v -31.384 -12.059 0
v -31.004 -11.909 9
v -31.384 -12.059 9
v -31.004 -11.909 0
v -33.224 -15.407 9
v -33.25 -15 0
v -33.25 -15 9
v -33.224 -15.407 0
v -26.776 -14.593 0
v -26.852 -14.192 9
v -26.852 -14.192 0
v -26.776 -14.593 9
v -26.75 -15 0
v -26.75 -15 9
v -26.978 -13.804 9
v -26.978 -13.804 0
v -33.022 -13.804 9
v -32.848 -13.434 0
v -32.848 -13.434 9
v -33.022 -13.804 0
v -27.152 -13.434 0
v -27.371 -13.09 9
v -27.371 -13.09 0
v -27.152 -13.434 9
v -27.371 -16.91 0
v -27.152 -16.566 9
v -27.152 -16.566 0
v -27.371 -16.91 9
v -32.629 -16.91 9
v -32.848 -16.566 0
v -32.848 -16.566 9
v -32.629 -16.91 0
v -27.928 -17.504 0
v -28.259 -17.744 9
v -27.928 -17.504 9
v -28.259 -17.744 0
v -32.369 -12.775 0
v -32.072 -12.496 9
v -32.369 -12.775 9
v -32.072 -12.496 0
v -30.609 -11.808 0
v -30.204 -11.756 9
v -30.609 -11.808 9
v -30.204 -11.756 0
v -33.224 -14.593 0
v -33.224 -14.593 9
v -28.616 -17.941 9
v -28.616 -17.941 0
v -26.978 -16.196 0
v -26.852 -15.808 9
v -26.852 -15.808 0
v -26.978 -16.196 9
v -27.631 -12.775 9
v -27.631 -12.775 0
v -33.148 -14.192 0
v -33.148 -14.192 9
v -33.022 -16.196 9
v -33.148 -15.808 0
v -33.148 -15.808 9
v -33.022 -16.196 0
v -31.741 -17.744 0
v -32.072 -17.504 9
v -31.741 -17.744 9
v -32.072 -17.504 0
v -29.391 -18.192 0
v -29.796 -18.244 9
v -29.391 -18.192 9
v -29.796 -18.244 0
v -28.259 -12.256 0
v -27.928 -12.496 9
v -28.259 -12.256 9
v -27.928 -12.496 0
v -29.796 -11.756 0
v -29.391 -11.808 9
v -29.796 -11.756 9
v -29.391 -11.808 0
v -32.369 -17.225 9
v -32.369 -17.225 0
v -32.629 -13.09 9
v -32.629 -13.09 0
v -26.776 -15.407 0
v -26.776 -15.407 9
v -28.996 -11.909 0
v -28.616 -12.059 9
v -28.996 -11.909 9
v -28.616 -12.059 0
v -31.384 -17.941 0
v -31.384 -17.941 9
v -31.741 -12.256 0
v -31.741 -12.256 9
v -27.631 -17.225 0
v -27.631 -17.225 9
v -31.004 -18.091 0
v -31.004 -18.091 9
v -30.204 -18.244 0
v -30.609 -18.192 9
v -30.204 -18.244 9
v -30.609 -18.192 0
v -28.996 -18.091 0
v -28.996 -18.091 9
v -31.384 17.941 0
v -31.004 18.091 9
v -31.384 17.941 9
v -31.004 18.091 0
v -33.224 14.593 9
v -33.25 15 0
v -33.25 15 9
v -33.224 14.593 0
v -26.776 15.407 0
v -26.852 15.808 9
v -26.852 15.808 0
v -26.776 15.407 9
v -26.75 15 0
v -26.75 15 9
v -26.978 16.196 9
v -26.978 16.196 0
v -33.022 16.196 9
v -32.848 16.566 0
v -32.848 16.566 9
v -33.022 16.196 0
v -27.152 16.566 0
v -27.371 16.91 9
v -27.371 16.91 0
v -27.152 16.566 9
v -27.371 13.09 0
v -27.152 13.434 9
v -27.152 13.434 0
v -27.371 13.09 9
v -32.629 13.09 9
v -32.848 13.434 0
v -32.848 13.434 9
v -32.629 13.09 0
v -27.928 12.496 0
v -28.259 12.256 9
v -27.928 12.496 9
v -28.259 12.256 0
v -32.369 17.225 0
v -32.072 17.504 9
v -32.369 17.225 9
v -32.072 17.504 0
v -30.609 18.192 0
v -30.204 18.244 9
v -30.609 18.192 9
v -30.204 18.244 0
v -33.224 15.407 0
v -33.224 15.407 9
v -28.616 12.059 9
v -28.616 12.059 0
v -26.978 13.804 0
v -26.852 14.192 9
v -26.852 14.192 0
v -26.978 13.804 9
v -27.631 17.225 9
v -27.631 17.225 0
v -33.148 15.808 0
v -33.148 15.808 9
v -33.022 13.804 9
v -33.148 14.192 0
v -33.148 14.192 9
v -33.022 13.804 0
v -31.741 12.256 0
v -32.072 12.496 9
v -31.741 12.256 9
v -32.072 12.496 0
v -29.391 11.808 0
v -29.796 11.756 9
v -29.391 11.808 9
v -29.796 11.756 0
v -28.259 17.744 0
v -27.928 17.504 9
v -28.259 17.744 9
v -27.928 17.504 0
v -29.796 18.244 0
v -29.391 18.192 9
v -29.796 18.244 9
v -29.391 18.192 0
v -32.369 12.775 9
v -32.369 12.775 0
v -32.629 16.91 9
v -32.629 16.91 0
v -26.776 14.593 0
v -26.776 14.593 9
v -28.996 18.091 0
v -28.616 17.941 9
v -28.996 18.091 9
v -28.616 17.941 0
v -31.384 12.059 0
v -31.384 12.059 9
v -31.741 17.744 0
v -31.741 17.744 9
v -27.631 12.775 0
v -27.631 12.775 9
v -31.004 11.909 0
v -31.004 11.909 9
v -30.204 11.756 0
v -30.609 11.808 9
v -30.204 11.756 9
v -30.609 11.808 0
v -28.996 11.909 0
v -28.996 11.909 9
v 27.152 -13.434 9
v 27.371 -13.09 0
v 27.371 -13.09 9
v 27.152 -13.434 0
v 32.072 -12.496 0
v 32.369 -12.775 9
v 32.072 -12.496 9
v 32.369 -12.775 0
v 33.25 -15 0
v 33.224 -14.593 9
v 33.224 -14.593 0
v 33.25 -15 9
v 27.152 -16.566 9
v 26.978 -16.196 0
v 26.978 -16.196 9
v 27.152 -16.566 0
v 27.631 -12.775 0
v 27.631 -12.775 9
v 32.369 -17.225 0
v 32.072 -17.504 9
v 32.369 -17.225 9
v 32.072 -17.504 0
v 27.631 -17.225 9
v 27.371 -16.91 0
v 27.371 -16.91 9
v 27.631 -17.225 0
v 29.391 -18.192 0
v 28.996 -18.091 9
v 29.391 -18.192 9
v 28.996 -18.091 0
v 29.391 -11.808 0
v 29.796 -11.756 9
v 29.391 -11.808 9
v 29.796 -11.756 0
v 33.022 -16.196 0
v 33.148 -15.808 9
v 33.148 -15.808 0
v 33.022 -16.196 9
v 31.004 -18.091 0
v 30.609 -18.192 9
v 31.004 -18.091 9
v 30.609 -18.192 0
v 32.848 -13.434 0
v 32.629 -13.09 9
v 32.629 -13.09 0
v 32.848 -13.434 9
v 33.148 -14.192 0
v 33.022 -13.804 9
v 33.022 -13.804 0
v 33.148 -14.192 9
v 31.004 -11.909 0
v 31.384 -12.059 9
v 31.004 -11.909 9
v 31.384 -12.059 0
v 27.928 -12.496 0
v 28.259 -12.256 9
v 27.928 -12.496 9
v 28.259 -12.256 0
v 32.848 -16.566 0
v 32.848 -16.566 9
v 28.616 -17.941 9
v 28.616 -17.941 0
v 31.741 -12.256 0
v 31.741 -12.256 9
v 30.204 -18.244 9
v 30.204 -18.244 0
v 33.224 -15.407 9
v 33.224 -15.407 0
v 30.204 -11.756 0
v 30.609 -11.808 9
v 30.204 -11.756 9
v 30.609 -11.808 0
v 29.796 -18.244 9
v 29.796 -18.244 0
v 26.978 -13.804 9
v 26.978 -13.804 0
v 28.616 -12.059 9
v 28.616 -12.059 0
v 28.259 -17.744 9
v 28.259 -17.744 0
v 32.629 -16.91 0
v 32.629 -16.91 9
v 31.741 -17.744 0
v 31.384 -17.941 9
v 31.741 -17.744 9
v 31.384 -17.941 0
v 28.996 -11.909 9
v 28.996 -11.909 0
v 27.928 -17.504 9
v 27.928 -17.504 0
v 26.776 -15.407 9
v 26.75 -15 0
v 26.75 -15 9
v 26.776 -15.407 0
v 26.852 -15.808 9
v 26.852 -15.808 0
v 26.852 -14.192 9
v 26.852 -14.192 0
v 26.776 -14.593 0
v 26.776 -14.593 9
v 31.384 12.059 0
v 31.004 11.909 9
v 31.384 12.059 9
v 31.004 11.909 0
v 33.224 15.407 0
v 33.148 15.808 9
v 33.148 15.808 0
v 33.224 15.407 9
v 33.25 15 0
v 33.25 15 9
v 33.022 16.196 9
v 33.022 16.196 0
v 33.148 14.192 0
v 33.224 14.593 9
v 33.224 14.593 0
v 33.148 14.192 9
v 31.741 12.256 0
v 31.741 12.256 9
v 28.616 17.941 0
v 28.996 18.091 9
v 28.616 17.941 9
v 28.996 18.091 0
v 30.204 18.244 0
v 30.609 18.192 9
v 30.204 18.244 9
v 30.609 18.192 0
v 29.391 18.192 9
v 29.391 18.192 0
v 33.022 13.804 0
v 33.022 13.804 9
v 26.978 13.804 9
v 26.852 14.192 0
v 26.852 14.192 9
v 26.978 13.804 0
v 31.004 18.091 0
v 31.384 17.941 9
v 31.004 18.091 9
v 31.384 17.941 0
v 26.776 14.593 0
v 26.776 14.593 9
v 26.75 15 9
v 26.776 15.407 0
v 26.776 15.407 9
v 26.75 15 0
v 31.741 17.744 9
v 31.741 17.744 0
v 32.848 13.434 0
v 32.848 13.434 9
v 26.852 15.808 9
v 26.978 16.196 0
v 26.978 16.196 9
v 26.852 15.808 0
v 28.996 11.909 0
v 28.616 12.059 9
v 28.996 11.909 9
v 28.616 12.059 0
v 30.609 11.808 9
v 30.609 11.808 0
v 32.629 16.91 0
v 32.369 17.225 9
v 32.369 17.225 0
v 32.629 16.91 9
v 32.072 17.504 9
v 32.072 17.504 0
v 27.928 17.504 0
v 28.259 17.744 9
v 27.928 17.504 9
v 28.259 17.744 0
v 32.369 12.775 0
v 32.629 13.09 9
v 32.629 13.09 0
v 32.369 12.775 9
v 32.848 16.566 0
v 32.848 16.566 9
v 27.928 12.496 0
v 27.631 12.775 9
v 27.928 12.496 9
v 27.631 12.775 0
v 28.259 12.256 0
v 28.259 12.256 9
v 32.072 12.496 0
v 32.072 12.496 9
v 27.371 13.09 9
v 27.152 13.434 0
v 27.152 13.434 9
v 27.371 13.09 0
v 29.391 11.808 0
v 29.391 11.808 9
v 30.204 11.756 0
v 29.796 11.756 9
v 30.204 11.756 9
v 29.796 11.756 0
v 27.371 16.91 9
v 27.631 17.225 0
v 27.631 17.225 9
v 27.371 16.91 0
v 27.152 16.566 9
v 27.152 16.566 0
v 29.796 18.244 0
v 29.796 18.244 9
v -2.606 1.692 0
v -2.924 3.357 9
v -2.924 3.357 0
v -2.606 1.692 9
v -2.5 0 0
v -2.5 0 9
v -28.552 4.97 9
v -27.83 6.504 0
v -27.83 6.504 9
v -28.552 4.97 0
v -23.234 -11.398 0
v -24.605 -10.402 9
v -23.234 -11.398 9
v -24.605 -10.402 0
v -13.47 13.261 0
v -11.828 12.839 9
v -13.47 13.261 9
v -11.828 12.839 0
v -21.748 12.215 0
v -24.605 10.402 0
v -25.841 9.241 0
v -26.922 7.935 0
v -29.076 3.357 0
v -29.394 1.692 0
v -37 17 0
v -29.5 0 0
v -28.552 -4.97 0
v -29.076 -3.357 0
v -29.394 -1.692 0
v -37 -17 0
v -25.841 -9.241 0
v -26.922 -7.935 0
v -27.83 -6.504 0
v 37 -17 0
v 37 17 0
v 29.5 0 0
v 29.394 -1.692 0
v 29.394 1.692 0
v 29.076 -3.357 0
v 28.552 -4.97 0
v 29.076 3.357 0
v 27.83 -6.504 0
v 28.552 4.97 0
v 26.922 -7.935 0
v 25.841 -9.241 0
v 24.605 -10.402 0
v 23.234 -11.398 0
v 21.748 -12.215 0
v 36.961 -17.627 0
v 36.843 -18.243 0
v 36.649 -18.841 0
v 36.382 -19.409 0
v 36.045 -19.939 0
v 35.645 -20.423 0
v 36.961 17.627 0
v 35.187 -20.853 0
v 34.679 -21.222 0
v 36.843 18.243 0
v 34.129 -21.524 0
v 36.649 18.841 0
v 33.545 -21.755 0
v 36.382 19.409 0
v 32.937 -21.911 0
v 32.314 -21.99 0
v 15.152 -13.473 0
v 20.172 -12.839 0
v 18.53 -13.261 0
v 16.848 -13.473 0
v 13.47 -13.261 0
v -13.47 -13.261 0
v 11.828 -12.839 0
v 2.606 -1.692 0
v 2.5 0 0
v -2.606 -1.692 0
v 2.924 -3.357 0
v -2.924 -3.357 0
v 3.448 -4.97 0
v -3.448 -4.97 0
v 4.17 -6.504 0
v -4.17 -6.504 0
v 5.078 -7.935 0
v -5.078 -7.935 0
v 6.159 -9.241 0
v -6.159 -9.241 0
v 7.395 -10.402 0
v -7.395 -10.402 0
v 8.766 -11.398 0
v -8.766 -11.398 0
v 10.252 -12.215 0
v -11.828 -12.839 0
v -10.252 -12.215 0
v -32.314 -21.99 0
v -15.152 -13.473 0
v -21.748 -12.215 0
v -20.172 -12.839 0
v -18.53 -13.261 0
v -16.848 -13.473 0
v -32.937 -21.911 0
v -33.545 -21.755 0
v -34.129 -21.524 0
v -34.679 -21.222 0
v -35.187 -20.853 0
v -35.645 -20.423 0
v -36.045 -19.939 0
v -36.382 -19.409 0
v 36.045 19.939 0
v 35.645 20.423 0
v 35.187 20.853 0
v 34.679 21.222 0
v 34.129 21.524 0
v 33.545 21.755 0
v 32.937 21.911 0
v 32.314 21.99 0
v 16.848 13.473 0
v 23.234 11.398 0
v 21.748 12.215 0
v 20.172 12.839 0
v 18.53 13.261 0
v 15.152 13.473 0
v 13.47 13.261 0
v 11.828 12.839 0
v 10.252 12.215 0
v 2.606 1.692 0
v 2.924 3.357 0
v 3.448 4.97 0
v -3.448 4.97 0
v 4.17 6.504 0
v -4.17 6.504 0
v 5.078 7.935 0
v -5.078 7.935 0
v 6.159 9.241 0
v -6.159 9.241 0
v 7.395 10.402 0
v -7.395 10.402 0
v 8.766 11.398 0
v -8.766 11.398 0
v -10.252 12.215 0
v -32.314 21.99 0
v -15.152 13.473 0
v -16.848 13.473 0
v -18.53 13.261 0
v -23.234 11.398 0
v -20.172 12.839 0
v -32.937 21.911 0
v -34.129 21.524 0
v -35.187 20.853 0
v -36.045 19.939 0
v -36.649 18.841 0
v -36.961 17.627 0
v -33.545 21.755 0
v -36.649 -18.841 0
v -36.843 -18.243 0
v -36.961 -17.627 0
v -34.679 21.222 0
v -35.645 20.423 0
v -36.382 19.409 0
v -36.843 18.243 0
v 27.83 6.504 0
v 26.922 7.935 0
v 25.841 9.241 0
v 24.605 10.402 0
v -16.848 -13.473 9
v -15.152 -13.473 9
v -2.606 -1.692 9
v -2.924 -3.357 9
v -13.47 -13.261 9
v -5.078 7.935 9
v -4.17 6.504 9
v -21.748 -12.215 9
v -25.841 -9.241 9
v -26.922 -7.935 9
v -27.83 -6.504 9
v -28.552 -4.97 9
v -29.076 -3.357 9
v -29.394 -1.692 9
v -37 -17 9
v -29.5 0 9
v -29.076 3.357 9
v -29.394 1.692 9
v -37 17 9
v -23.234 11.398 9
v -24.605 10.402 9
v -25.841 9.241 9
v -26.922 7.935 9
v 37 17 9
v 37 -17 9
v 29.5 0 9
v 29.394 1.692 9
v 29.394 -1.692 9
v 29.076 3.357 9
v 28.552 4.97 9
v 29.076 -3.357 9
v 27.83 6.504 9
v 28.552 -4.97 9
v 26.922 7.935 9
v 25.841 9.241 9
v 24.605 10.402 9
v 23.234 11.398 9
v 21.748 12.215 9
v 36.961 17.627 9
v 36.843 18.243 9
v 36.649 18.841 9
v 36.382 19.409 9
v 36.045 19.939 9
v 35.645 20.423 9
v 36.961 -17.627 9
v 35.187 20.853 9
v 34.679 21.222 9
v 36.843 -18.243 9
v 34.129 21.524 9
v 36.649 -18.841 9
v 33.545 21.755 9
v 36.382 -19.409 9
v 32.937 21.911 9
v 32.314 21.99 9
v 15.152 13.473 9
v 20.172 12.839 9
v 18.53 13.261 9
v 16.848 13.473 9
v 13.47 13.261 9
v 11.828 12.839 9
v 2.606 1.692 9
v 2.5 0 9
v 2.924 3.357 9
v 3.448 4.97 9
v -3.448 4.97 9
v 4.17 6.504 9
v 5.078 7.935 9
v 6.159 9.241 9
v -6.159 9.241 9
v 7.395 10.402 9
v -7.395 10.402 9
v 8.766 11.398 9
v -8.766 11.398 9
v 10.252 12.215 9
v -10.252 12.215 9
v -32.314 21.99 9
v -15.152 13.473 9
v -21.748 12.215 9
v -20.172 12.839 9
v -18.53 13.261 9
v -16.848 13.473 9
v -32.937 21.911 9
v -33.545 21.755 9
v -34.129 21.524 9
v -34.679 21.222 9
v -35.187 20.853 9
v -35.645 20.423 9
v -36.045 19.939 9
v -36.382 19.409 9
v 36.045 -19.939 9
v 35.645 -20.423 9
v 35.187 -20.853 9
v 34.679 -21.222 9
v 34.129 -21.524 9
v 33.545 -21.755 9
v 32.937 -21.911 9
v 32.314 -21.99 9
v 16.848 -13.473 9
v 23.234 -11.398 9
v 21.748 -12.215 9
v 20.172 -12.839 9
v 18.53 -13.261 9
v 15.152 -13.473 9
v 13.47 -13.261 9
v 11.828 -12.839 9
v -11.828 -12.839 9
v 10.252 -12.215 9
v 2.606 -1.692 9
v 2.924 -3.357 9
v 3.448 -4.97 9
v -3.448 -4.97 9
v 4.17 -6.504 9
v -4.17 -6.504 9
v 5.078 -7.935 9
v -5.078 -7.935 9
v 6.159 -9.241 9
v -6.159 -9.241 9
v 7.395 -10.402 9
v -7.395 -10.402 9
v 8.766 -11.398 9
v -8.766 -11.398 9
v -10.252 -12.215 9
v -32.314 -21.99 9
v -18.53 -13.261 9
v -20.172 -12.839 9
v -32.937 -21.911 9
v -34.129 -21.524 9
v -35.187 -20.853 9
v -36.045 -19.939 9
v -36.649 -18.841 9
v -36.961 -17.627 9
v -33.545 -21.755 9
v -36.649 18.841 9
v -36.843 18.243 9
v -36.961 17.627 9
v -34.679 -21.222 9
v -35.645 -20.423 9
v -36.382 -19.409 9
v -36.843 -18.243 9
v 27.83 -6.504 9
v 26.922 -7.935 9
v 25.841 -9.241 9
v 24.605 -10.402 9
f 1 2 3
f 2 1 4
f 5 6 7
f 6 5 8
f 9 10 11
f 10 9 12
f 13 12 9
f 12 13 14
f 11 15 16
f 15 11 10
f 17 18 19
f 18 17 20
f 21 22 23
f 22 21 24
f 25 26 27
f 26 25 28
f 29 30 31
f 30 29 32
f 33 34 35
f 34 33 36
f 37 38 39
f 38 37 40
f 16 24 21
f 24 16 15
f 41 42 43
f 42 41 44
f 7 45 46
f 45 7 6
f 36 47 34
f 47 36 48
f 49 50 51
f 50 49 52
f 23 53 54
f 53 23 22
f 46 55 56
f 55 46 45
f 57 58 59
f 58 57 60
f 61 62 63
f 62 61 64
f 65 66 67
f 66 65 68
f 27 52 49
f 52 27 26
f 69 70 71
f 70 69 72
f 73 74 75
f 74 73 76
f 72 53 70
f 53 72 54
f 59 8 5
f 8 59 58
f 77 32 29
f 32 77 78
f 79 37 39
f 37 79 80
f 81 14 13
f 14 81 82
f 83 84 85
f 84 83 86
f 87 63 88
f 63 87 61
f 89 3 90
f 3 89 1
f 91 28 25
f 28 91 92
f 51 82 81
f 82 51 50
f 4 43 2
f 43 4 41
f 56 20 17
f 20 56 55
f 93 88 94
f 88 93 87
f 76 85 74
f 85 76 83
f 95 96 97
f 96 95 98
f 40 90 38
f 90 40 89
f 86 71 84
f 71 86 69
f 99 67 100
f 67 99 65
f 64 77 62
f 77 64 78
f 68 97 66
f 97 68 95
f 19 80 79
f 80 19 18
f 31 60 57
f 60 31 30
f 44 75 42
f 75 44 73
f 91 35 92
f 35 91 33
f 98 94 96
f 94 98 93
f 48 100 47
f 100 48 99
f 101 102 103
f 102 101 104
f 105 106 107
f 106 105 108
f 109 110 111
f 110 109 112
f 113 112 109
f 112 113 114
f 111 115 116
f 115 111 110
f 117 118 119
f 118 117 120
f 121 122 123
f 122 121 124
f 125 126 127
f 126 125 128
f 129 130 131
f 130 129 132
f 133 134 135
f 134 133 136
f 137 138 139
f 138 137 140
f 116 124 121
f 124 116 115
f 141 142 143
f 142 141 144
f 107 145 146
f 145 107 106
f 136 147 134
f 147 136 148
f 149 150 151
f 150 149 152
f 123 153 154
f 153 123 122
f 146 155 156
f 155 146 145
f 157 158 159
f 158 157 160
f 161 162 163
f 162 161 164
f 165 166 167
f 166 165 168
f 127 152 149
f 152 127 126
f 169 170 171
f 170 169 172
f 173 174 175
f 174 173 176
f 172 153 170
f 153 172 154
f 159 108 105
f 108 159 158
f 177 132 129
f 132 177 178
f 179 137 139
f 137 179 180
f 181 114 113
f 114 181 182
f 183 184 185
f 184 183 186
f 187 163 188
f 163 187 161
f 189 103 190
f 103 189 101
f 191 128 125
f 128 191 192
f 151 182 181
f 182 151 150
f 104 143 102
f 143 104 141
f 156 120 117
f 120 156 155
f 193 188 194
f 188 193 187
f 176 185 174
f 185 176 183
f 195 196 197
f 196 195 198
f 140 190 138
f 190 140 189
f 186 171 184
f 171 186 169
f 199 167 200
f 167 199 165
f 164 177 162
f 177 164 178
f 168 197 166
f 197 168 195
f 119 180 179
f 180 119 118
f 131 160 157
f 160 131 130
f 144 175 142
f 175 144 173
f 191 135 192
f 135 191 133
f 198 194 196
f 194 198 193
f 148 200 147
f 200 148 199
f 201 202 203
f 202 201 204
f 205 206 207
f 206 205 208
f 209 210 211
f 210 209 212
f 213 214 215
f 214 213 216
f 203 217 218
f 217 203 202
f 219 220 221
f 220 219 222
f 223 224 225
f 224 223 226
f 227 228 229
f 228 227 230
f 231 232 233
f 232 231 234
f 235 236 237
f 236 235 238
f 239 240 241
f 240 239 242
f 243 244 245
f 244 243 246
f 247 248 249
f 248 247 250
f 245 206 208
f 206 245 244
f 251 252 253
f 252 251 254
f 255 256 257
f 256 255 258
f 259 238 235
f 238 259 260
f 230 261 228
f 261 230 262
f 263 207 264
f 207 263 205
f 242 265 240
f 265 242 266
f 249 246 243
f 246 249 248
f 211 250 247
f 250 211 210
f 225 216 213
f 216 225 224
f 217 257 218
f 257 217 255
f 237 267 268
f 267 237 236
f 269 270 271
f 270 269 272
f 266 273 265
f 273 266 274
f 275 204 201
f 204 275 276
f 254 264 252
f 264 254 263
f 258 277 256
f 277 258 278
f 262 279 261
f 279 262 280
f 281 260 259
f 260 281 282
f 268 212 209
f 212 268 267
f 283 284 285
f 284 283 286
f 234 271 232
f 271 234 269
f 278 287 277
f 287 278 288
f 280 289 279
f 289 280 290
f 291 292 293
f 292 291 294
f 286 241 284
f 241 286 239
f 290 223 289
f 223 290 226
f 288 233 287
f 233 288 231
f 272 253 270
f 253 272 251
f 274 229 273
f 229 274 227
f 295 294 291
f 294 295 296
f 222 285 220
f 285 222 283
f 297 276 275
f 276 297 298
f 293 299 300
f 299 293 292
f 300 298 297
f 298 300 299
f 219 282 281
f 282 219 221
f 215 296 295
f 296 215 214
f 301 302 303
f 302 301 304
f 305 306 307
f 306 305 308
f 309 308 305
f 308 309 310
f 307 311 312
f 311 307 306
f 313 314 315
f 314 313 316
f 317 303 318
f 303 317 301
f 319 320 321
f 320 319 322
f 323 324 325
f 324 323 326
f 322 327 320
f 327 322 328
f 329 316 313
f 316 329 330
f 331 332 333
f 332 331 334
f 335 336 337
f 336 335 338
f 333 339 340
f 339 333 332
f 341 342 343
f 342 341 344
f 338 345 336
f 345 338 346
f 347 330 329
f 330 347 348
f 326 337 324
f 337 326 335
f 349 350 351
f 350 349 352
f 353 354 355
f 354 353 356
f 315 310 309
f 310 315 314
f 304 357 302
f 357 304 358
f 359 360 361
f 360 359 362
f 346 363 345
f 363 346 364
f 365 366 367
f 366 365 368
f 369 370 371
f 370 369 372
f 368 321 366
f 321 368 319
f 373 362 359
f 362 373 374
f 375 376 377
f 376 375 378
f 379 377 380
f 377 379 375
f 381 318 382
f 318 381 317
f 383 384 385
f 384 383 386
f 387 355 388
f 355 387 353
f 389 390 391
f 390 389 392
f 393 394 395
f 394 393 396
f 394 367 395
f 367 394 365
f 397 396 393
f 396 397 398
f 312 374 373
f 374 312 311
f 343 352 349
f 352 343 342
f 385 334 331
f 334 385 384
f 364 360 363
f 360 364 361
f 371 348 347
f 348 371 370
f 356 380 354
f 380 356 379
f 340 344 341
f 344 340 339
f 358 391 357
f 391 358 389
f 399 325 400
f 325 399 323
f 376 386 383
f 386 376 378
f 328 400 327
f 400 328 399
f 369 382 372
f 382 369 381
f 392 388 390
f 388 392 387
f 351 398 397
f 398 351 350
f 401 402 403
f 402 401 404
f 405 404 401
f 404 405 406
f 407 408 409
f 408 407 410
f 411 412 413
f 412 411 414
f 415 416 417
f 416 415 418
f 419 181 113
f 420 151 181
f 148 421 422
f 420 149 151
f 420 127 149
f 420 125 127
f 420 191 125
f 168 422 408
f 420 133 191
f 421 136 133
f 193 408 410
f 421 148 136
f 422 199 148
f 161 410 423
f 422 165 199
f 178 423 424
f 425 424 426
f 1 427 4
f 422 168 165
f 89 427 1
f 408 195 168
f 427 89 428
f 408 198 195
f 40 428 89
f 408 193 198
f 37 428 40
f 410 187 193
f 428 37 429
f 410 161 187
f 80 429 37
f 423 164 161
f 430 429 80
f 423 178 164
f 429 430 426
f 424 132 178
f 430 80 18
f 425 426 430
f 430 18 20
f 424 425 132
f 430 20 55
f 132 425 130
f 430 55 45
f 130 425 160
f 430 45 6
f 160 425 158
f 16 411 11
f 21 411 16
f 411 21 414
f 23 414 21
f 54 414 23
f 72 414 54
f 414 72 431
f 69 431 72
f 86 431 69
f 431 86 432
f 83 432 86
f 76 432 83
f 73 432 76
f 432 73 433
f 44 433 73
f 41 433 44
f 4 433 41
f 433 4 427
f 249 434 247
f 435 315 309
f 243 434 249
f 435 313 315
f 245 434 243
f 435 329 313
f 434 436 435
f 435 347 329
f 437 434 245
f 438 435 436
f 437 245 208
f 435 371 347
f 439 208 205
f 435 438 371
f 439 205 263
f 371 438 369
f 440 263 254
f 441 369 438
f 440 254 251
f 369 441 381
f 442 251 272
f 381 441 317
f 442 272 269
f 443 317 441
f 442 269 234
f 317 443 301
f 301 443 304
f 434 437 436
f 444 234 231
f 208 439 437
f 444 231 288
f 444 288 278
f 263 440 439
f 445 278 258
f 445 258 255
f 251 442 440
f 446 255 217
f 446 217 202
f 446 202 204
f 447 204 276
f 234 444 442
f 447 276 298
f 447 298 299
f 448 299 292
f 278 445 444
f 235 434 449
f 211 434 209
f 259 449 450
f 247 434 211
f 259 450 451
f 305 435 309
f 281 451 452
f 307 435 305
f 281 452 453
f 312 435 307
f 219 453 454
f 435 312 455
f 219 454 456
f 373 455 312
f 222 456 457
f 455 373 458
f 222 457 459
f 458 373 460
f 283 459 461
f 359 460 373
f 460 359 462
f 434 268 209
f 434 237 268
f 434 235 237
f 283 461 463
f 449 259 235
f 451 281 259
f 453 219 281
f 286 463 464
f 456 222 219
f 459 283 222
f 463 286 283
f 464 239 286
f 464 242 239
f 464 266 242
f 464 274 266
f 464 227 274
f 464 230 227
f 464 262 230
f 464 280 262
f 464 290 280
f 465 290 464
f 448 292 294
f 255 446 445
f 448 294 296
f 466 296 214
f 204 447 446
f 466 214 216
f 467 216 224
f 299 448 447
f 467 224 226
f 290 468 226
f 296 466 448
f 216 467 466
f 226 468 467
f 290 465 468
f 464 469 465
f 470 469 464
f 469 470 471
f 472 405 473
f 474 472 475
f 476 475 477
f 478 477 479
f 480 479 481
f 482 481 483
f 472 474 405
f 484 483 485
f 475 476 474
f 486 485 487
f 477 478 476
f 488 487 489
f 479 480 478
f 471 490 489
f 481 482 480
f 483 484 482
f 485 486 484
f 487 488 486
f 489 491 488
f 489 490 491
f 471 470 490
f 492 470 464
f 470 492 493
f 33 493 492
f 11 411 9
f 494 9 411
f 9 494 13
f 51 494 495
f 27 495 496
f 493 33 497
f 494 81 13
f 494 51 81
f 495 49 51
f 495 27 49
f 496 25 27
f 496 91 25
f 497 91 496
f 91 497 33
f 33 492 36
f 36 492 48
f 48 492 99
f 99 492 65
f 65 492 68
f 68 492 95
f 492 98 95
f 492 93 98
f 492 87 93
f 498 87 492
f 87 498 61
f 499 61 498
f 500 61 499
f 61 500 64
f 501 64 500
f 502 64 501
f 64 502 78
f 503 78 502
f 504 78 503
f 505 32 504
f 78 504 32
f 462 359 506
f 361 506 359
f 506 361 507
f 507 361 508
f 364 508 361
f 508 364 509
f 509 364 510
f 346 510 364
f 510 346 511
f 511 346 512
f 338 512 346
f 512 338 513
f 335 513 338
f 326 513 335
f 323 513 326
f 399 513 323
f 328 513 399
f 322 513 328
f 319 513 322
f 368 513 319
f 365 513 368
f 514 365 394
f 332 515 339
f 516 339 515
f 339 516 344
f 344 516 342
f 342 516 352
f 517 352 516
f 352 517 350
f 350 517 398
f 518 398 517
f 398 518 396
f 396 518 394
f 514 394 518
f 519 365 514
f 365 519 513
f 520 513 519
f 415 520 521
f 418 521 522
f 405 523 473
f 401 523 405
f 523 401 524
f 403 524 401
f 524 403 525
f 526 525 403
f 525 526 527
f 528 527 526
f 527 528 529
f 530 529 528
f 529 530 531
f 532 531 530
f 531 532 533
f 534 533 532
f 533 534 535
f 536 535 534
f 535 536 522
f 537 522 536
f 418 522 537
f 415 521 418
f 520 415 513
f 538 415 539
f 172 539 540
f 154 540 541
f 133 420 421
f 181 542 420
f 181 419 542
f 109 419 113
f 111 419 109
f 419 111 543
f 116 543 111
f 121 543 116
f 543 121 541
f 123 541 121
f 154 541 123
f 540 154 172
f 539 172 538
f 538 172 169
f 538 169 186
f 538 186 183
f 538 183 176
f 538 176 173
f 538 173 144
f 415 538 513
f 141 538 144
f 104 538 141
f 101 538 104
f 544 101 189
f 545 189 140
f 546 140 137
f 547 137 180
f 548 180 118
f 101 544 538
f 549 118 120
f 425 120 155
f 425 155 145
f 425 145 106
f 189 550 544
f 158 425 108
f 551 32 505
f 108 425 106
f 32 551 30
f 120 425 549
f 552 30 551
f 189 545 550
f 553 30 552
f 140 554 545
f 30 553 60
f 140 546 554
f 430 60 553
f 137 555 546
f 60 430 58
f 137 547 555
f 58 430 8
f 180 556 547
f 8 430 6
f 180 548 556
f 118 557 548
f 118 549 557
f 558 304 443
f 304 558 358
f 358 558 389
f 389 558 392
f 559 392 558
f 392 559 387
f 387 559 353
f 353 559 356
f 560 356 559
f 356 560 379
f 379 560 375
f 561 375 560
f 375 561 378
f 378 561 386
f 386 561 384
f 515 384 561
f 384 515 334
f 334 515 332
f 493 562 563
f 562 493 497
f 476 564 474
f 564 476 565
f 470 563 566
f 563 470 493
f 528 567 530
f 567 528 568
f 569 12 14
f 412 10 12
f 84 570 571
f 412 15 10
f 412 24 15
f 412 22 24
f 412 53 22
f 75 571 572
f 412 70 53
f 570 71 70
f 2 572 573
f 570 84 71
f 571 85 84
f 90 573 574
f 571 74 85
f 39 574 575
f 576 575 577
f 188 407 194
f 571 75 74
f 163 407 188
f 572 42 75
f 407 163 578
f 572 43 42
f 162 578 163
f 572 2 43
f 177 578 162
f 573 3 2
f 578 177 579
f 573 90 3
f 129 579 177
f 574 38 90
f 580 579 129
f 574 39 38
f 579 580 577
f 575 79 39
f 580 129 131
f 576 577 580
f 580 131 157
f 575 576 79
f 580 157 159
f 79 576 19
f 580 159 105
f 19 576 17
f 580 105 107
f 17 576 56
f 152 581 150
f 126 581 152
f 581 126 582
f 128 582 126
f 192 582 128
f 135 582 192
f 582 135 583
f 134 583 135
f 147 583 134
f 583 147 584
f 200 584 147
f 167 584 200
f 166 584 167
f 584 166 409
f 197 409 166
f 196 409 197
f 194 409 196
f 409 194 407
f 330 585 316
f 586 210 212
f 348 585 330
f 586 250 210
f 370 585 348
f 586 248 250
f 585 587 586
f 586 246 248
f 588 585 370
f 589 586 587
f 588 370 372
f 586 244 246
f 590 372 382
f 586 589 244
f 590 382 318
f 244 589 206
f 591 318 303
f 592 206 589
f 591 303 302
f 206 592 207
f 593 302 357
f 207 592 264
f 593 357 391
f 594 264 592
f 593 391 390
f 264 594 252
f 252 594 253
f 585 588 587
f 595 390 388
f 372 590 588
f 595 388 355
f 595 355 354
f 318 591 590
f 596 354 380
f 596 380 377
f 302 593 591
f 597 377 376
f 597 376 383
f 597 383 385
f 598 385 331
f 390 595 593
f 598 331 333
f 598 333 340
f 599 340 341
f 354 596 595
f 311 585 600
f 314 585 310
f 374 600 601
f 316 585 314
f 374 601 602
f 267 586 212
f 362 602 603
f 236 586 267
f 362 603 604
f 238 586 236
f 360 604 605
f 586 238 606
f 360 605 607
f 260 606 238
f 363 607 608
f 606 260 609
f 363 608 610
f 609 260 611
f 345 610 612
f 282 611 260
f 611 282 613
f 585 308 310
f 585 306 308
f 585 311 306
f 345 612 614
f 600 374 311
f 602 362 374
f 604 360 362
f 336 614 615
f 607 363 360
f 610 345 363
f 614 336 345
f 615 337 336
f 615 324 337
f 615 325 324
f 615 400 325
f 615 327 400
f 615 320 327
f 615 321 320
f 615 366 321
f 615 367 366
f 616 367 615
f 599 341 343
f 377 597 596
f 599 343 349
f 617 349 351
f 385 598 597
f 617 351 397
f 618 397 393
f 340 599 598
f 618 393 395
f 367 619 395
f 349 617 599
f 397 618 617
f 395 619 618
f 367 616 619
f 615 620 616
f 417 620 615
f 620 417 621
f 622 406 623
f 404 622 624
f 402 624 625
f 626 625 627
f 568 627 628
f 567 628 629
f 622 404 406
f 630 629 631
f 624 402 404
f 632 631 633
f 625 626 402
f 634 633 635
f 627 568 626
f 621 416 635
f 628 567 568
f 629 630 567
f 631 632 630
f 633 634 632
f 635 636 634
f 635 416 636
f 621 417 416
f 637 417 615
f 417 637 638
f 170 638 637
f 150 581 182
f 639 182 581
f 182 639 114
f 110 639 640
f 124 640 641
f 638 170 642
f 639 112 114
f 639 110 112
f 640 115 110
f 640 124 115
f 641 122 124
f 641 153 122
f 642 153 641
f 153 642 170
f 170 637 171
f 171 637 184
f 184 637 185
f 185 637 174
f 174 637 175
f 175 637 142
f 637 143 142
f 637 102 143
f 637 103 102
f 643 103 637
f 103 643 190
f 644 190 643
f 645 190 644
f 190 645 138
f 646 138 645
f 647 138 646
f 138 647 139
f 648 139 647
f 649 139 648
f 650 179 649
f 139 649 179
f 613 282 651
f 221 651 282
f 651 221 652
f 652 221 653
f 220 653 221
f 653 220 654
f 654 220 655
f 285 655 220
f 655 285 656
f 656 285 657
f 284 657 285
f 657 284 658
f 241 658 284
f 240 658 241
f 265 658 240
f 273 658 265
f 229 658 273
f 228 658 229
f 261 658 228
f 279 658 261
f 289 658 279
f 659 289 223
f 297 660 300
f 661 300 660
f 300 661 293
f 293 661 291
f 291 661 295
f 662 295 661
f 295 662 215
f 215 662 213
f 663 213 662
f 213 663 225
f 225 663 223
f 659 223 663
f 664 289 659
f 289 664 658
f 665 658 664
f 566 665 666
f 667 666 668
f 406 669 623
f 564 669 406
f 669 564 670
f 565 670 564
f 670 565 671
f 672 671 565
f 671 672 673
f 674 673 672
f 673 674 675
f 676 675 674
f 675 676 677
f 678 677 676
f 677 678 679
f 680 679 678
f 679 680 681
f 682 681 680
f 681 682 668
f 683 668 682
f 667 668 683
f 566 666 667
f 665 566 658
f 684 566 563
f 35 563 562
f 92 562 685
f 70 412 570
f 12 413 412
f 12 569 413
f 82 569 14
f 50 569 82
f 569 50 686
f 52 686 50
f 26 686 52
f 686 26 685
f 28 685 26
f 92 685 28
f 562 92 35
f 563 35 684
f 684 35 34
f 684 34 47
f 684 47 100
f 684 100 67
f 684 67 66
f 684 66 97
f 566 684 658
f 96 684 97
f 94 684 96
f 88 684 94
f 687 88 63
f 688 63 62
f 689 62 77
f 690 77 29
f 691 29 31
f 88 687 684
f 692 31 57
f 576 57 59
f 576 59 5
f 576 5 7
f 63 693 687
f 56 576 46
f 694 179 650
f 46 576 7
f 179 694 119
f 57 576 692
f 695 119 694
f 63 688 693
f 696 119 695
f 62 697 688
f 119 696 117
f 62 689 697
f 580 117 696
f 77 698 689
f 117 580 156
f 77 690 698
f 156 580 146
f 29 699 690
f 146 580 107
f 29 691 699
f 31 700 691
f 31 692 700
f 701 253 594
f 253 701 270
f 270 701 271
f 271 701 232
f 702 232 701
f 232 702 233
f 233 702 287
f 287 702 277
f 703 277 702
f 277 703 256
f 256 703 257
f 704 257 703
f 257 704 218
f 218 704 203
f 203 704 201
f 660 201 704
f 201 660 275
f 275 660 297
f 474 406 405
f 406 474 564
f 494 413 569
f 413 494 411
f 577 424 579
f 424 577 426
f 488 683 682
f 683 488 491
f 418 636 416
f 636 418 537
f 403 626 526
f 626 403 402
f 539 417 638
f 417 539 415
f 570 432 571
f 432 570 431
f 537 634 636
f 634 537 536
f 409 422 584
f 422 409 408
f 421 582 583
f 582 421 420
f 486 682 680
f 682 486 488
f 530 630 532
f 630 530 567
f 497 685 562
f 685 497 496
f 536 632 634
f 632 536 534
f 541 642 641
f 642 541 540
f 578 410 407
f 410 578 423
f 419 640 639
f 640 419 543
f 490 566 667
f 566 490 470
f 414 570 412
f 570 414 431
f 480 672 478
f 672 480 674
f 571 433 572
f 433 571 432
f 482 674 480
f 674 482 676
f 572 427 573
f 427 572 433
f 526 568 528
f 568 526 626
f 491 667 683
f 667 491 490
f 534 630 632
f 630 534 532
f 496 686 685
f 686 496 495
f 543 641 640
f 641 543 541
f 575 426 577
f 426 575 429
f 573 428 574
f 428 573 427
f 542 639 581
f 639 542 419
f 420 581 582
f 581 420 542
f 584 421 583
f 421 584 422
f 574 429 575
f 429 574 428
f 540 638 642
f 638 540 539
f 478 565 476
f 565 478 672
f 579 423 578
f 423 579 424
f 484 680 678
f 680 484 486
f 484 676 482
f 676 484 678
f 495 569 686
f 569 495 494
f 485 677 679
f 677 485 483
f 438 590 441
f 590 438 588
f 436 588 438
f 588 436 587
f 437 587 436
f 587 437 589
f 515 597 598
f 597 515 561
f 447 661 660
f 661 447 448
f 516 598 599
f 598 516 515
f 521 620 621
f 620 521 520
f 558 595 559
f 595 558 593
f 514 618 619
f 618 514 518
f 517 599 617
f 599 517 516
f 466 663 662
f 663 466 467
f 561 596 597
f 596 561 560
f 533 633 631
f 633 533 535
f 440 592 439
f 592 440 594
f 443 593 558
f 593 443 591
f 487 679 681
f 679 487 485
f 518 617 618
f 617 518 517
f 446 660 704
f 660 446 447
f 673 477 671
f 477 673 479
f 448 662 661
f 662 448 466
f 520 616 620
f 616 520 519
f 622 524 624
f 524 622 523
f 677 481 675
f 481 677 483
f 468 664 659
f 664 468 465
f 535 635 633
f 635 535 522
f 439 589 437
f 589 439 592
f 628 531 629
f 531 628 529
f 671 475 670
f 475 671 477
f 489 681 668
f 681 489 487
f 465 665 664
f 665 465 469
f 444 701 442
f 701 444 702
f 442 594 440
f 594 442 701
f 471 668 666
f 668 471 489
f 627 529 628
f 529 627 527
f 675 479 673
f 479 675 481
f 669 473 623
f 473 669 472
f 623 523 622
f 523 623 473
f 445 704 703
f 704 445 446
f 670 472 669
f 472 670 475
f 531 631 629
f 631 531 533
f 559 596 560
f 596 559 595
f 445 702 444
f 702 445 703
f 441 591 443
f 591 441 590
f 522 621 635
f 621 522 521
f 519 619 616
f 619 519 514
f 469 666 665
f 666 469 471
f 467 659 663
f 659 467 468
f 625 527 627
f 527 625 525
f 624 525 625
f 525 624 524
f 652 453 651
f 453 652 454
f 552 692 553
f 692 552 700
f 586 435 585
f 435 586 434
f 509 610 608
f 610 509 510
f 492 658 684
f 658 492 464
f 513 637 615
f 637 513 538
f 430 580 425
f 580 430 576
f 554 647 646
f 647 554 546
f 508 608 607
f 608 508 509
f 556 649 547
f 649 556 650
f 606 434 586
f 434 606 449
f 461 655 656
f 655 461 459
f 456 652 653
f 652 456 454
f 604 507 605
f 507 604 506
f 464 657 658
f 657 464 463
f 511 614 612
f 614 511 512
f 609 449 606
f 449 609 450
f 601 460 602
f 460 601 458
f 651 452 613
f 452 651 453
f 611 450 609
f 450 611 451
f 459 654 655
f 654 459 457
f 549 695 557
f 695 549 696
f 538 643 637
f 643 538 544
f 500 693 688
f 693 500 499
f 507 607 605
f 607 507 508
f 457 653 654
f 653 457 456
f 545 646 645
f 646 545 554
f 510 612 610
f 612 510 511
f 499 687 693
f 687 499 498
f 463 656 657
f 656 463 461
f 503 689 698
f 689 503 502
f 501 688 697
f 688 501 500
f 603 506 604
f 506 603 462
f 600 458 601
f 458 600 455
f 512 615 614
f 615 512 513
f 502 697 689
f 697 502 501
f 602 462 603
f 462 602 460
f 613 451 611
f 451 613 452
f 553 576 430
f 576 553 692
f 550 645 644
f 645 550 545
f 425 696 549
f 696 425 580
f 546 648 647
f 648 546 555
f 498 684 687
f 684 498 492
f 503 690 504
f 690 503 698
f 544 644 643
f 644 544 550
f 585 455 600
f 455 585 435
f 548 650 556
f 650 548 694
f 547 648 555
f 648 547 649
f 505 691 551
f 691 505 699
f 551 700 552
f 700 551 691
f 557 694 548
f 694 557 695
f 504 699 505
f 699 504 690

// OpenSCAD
$fn = 50;


difference() {
	union() {
		hull() {
			translate(v = [-32.0000000000, 17.0000000000, 0]) {
				cylinder(h = 9, r = 5);
			}
			translate(v = [32.0000000000, 17.0000000000, 0]) {
				cylinder(h = 9, r = 5);
			}
			translate(v = [-32.0000000000, -17.0000000000, 0]) {
				cylinder(h = 9, r = 5);
			}
			translate(v = [32.0000000000, -17.0000000000, 0]) {
				cylinder(h = 9, r = 5);
			}
		}
	}
	union() {
		#translate(v = [-30.0000000000, -15.0000000000, -100.0000000000]) {
			cylinder(h = 200, r = 3.2500000000);
		}
		#translate(v = [-30.0000000000, 15.0000000000, -100.0000000000]) {
			cylinder(h = 200, r = 3.2500000000);
		}
		#translate(v = [30.0000000000, -15.0000000000, -100.0000000000]) {
			cylinder(h = 200, r = 3.2500000000);
		}
		#translate(v = [30.0000000000, 15.0000000000, -100.0000000000]) {
			cylinder(h = 200, r = 3.2500000000);
		}
		#translate(v = [-16.0000000000, 0, 0]) {
			cylinder(h = 9, r = 13.5000000000);
		}
		#translate(v = [16.0000000000, 0, 0]) {
			cylinder(h = 9, r = 13.5000000000);
		}
	}
}
